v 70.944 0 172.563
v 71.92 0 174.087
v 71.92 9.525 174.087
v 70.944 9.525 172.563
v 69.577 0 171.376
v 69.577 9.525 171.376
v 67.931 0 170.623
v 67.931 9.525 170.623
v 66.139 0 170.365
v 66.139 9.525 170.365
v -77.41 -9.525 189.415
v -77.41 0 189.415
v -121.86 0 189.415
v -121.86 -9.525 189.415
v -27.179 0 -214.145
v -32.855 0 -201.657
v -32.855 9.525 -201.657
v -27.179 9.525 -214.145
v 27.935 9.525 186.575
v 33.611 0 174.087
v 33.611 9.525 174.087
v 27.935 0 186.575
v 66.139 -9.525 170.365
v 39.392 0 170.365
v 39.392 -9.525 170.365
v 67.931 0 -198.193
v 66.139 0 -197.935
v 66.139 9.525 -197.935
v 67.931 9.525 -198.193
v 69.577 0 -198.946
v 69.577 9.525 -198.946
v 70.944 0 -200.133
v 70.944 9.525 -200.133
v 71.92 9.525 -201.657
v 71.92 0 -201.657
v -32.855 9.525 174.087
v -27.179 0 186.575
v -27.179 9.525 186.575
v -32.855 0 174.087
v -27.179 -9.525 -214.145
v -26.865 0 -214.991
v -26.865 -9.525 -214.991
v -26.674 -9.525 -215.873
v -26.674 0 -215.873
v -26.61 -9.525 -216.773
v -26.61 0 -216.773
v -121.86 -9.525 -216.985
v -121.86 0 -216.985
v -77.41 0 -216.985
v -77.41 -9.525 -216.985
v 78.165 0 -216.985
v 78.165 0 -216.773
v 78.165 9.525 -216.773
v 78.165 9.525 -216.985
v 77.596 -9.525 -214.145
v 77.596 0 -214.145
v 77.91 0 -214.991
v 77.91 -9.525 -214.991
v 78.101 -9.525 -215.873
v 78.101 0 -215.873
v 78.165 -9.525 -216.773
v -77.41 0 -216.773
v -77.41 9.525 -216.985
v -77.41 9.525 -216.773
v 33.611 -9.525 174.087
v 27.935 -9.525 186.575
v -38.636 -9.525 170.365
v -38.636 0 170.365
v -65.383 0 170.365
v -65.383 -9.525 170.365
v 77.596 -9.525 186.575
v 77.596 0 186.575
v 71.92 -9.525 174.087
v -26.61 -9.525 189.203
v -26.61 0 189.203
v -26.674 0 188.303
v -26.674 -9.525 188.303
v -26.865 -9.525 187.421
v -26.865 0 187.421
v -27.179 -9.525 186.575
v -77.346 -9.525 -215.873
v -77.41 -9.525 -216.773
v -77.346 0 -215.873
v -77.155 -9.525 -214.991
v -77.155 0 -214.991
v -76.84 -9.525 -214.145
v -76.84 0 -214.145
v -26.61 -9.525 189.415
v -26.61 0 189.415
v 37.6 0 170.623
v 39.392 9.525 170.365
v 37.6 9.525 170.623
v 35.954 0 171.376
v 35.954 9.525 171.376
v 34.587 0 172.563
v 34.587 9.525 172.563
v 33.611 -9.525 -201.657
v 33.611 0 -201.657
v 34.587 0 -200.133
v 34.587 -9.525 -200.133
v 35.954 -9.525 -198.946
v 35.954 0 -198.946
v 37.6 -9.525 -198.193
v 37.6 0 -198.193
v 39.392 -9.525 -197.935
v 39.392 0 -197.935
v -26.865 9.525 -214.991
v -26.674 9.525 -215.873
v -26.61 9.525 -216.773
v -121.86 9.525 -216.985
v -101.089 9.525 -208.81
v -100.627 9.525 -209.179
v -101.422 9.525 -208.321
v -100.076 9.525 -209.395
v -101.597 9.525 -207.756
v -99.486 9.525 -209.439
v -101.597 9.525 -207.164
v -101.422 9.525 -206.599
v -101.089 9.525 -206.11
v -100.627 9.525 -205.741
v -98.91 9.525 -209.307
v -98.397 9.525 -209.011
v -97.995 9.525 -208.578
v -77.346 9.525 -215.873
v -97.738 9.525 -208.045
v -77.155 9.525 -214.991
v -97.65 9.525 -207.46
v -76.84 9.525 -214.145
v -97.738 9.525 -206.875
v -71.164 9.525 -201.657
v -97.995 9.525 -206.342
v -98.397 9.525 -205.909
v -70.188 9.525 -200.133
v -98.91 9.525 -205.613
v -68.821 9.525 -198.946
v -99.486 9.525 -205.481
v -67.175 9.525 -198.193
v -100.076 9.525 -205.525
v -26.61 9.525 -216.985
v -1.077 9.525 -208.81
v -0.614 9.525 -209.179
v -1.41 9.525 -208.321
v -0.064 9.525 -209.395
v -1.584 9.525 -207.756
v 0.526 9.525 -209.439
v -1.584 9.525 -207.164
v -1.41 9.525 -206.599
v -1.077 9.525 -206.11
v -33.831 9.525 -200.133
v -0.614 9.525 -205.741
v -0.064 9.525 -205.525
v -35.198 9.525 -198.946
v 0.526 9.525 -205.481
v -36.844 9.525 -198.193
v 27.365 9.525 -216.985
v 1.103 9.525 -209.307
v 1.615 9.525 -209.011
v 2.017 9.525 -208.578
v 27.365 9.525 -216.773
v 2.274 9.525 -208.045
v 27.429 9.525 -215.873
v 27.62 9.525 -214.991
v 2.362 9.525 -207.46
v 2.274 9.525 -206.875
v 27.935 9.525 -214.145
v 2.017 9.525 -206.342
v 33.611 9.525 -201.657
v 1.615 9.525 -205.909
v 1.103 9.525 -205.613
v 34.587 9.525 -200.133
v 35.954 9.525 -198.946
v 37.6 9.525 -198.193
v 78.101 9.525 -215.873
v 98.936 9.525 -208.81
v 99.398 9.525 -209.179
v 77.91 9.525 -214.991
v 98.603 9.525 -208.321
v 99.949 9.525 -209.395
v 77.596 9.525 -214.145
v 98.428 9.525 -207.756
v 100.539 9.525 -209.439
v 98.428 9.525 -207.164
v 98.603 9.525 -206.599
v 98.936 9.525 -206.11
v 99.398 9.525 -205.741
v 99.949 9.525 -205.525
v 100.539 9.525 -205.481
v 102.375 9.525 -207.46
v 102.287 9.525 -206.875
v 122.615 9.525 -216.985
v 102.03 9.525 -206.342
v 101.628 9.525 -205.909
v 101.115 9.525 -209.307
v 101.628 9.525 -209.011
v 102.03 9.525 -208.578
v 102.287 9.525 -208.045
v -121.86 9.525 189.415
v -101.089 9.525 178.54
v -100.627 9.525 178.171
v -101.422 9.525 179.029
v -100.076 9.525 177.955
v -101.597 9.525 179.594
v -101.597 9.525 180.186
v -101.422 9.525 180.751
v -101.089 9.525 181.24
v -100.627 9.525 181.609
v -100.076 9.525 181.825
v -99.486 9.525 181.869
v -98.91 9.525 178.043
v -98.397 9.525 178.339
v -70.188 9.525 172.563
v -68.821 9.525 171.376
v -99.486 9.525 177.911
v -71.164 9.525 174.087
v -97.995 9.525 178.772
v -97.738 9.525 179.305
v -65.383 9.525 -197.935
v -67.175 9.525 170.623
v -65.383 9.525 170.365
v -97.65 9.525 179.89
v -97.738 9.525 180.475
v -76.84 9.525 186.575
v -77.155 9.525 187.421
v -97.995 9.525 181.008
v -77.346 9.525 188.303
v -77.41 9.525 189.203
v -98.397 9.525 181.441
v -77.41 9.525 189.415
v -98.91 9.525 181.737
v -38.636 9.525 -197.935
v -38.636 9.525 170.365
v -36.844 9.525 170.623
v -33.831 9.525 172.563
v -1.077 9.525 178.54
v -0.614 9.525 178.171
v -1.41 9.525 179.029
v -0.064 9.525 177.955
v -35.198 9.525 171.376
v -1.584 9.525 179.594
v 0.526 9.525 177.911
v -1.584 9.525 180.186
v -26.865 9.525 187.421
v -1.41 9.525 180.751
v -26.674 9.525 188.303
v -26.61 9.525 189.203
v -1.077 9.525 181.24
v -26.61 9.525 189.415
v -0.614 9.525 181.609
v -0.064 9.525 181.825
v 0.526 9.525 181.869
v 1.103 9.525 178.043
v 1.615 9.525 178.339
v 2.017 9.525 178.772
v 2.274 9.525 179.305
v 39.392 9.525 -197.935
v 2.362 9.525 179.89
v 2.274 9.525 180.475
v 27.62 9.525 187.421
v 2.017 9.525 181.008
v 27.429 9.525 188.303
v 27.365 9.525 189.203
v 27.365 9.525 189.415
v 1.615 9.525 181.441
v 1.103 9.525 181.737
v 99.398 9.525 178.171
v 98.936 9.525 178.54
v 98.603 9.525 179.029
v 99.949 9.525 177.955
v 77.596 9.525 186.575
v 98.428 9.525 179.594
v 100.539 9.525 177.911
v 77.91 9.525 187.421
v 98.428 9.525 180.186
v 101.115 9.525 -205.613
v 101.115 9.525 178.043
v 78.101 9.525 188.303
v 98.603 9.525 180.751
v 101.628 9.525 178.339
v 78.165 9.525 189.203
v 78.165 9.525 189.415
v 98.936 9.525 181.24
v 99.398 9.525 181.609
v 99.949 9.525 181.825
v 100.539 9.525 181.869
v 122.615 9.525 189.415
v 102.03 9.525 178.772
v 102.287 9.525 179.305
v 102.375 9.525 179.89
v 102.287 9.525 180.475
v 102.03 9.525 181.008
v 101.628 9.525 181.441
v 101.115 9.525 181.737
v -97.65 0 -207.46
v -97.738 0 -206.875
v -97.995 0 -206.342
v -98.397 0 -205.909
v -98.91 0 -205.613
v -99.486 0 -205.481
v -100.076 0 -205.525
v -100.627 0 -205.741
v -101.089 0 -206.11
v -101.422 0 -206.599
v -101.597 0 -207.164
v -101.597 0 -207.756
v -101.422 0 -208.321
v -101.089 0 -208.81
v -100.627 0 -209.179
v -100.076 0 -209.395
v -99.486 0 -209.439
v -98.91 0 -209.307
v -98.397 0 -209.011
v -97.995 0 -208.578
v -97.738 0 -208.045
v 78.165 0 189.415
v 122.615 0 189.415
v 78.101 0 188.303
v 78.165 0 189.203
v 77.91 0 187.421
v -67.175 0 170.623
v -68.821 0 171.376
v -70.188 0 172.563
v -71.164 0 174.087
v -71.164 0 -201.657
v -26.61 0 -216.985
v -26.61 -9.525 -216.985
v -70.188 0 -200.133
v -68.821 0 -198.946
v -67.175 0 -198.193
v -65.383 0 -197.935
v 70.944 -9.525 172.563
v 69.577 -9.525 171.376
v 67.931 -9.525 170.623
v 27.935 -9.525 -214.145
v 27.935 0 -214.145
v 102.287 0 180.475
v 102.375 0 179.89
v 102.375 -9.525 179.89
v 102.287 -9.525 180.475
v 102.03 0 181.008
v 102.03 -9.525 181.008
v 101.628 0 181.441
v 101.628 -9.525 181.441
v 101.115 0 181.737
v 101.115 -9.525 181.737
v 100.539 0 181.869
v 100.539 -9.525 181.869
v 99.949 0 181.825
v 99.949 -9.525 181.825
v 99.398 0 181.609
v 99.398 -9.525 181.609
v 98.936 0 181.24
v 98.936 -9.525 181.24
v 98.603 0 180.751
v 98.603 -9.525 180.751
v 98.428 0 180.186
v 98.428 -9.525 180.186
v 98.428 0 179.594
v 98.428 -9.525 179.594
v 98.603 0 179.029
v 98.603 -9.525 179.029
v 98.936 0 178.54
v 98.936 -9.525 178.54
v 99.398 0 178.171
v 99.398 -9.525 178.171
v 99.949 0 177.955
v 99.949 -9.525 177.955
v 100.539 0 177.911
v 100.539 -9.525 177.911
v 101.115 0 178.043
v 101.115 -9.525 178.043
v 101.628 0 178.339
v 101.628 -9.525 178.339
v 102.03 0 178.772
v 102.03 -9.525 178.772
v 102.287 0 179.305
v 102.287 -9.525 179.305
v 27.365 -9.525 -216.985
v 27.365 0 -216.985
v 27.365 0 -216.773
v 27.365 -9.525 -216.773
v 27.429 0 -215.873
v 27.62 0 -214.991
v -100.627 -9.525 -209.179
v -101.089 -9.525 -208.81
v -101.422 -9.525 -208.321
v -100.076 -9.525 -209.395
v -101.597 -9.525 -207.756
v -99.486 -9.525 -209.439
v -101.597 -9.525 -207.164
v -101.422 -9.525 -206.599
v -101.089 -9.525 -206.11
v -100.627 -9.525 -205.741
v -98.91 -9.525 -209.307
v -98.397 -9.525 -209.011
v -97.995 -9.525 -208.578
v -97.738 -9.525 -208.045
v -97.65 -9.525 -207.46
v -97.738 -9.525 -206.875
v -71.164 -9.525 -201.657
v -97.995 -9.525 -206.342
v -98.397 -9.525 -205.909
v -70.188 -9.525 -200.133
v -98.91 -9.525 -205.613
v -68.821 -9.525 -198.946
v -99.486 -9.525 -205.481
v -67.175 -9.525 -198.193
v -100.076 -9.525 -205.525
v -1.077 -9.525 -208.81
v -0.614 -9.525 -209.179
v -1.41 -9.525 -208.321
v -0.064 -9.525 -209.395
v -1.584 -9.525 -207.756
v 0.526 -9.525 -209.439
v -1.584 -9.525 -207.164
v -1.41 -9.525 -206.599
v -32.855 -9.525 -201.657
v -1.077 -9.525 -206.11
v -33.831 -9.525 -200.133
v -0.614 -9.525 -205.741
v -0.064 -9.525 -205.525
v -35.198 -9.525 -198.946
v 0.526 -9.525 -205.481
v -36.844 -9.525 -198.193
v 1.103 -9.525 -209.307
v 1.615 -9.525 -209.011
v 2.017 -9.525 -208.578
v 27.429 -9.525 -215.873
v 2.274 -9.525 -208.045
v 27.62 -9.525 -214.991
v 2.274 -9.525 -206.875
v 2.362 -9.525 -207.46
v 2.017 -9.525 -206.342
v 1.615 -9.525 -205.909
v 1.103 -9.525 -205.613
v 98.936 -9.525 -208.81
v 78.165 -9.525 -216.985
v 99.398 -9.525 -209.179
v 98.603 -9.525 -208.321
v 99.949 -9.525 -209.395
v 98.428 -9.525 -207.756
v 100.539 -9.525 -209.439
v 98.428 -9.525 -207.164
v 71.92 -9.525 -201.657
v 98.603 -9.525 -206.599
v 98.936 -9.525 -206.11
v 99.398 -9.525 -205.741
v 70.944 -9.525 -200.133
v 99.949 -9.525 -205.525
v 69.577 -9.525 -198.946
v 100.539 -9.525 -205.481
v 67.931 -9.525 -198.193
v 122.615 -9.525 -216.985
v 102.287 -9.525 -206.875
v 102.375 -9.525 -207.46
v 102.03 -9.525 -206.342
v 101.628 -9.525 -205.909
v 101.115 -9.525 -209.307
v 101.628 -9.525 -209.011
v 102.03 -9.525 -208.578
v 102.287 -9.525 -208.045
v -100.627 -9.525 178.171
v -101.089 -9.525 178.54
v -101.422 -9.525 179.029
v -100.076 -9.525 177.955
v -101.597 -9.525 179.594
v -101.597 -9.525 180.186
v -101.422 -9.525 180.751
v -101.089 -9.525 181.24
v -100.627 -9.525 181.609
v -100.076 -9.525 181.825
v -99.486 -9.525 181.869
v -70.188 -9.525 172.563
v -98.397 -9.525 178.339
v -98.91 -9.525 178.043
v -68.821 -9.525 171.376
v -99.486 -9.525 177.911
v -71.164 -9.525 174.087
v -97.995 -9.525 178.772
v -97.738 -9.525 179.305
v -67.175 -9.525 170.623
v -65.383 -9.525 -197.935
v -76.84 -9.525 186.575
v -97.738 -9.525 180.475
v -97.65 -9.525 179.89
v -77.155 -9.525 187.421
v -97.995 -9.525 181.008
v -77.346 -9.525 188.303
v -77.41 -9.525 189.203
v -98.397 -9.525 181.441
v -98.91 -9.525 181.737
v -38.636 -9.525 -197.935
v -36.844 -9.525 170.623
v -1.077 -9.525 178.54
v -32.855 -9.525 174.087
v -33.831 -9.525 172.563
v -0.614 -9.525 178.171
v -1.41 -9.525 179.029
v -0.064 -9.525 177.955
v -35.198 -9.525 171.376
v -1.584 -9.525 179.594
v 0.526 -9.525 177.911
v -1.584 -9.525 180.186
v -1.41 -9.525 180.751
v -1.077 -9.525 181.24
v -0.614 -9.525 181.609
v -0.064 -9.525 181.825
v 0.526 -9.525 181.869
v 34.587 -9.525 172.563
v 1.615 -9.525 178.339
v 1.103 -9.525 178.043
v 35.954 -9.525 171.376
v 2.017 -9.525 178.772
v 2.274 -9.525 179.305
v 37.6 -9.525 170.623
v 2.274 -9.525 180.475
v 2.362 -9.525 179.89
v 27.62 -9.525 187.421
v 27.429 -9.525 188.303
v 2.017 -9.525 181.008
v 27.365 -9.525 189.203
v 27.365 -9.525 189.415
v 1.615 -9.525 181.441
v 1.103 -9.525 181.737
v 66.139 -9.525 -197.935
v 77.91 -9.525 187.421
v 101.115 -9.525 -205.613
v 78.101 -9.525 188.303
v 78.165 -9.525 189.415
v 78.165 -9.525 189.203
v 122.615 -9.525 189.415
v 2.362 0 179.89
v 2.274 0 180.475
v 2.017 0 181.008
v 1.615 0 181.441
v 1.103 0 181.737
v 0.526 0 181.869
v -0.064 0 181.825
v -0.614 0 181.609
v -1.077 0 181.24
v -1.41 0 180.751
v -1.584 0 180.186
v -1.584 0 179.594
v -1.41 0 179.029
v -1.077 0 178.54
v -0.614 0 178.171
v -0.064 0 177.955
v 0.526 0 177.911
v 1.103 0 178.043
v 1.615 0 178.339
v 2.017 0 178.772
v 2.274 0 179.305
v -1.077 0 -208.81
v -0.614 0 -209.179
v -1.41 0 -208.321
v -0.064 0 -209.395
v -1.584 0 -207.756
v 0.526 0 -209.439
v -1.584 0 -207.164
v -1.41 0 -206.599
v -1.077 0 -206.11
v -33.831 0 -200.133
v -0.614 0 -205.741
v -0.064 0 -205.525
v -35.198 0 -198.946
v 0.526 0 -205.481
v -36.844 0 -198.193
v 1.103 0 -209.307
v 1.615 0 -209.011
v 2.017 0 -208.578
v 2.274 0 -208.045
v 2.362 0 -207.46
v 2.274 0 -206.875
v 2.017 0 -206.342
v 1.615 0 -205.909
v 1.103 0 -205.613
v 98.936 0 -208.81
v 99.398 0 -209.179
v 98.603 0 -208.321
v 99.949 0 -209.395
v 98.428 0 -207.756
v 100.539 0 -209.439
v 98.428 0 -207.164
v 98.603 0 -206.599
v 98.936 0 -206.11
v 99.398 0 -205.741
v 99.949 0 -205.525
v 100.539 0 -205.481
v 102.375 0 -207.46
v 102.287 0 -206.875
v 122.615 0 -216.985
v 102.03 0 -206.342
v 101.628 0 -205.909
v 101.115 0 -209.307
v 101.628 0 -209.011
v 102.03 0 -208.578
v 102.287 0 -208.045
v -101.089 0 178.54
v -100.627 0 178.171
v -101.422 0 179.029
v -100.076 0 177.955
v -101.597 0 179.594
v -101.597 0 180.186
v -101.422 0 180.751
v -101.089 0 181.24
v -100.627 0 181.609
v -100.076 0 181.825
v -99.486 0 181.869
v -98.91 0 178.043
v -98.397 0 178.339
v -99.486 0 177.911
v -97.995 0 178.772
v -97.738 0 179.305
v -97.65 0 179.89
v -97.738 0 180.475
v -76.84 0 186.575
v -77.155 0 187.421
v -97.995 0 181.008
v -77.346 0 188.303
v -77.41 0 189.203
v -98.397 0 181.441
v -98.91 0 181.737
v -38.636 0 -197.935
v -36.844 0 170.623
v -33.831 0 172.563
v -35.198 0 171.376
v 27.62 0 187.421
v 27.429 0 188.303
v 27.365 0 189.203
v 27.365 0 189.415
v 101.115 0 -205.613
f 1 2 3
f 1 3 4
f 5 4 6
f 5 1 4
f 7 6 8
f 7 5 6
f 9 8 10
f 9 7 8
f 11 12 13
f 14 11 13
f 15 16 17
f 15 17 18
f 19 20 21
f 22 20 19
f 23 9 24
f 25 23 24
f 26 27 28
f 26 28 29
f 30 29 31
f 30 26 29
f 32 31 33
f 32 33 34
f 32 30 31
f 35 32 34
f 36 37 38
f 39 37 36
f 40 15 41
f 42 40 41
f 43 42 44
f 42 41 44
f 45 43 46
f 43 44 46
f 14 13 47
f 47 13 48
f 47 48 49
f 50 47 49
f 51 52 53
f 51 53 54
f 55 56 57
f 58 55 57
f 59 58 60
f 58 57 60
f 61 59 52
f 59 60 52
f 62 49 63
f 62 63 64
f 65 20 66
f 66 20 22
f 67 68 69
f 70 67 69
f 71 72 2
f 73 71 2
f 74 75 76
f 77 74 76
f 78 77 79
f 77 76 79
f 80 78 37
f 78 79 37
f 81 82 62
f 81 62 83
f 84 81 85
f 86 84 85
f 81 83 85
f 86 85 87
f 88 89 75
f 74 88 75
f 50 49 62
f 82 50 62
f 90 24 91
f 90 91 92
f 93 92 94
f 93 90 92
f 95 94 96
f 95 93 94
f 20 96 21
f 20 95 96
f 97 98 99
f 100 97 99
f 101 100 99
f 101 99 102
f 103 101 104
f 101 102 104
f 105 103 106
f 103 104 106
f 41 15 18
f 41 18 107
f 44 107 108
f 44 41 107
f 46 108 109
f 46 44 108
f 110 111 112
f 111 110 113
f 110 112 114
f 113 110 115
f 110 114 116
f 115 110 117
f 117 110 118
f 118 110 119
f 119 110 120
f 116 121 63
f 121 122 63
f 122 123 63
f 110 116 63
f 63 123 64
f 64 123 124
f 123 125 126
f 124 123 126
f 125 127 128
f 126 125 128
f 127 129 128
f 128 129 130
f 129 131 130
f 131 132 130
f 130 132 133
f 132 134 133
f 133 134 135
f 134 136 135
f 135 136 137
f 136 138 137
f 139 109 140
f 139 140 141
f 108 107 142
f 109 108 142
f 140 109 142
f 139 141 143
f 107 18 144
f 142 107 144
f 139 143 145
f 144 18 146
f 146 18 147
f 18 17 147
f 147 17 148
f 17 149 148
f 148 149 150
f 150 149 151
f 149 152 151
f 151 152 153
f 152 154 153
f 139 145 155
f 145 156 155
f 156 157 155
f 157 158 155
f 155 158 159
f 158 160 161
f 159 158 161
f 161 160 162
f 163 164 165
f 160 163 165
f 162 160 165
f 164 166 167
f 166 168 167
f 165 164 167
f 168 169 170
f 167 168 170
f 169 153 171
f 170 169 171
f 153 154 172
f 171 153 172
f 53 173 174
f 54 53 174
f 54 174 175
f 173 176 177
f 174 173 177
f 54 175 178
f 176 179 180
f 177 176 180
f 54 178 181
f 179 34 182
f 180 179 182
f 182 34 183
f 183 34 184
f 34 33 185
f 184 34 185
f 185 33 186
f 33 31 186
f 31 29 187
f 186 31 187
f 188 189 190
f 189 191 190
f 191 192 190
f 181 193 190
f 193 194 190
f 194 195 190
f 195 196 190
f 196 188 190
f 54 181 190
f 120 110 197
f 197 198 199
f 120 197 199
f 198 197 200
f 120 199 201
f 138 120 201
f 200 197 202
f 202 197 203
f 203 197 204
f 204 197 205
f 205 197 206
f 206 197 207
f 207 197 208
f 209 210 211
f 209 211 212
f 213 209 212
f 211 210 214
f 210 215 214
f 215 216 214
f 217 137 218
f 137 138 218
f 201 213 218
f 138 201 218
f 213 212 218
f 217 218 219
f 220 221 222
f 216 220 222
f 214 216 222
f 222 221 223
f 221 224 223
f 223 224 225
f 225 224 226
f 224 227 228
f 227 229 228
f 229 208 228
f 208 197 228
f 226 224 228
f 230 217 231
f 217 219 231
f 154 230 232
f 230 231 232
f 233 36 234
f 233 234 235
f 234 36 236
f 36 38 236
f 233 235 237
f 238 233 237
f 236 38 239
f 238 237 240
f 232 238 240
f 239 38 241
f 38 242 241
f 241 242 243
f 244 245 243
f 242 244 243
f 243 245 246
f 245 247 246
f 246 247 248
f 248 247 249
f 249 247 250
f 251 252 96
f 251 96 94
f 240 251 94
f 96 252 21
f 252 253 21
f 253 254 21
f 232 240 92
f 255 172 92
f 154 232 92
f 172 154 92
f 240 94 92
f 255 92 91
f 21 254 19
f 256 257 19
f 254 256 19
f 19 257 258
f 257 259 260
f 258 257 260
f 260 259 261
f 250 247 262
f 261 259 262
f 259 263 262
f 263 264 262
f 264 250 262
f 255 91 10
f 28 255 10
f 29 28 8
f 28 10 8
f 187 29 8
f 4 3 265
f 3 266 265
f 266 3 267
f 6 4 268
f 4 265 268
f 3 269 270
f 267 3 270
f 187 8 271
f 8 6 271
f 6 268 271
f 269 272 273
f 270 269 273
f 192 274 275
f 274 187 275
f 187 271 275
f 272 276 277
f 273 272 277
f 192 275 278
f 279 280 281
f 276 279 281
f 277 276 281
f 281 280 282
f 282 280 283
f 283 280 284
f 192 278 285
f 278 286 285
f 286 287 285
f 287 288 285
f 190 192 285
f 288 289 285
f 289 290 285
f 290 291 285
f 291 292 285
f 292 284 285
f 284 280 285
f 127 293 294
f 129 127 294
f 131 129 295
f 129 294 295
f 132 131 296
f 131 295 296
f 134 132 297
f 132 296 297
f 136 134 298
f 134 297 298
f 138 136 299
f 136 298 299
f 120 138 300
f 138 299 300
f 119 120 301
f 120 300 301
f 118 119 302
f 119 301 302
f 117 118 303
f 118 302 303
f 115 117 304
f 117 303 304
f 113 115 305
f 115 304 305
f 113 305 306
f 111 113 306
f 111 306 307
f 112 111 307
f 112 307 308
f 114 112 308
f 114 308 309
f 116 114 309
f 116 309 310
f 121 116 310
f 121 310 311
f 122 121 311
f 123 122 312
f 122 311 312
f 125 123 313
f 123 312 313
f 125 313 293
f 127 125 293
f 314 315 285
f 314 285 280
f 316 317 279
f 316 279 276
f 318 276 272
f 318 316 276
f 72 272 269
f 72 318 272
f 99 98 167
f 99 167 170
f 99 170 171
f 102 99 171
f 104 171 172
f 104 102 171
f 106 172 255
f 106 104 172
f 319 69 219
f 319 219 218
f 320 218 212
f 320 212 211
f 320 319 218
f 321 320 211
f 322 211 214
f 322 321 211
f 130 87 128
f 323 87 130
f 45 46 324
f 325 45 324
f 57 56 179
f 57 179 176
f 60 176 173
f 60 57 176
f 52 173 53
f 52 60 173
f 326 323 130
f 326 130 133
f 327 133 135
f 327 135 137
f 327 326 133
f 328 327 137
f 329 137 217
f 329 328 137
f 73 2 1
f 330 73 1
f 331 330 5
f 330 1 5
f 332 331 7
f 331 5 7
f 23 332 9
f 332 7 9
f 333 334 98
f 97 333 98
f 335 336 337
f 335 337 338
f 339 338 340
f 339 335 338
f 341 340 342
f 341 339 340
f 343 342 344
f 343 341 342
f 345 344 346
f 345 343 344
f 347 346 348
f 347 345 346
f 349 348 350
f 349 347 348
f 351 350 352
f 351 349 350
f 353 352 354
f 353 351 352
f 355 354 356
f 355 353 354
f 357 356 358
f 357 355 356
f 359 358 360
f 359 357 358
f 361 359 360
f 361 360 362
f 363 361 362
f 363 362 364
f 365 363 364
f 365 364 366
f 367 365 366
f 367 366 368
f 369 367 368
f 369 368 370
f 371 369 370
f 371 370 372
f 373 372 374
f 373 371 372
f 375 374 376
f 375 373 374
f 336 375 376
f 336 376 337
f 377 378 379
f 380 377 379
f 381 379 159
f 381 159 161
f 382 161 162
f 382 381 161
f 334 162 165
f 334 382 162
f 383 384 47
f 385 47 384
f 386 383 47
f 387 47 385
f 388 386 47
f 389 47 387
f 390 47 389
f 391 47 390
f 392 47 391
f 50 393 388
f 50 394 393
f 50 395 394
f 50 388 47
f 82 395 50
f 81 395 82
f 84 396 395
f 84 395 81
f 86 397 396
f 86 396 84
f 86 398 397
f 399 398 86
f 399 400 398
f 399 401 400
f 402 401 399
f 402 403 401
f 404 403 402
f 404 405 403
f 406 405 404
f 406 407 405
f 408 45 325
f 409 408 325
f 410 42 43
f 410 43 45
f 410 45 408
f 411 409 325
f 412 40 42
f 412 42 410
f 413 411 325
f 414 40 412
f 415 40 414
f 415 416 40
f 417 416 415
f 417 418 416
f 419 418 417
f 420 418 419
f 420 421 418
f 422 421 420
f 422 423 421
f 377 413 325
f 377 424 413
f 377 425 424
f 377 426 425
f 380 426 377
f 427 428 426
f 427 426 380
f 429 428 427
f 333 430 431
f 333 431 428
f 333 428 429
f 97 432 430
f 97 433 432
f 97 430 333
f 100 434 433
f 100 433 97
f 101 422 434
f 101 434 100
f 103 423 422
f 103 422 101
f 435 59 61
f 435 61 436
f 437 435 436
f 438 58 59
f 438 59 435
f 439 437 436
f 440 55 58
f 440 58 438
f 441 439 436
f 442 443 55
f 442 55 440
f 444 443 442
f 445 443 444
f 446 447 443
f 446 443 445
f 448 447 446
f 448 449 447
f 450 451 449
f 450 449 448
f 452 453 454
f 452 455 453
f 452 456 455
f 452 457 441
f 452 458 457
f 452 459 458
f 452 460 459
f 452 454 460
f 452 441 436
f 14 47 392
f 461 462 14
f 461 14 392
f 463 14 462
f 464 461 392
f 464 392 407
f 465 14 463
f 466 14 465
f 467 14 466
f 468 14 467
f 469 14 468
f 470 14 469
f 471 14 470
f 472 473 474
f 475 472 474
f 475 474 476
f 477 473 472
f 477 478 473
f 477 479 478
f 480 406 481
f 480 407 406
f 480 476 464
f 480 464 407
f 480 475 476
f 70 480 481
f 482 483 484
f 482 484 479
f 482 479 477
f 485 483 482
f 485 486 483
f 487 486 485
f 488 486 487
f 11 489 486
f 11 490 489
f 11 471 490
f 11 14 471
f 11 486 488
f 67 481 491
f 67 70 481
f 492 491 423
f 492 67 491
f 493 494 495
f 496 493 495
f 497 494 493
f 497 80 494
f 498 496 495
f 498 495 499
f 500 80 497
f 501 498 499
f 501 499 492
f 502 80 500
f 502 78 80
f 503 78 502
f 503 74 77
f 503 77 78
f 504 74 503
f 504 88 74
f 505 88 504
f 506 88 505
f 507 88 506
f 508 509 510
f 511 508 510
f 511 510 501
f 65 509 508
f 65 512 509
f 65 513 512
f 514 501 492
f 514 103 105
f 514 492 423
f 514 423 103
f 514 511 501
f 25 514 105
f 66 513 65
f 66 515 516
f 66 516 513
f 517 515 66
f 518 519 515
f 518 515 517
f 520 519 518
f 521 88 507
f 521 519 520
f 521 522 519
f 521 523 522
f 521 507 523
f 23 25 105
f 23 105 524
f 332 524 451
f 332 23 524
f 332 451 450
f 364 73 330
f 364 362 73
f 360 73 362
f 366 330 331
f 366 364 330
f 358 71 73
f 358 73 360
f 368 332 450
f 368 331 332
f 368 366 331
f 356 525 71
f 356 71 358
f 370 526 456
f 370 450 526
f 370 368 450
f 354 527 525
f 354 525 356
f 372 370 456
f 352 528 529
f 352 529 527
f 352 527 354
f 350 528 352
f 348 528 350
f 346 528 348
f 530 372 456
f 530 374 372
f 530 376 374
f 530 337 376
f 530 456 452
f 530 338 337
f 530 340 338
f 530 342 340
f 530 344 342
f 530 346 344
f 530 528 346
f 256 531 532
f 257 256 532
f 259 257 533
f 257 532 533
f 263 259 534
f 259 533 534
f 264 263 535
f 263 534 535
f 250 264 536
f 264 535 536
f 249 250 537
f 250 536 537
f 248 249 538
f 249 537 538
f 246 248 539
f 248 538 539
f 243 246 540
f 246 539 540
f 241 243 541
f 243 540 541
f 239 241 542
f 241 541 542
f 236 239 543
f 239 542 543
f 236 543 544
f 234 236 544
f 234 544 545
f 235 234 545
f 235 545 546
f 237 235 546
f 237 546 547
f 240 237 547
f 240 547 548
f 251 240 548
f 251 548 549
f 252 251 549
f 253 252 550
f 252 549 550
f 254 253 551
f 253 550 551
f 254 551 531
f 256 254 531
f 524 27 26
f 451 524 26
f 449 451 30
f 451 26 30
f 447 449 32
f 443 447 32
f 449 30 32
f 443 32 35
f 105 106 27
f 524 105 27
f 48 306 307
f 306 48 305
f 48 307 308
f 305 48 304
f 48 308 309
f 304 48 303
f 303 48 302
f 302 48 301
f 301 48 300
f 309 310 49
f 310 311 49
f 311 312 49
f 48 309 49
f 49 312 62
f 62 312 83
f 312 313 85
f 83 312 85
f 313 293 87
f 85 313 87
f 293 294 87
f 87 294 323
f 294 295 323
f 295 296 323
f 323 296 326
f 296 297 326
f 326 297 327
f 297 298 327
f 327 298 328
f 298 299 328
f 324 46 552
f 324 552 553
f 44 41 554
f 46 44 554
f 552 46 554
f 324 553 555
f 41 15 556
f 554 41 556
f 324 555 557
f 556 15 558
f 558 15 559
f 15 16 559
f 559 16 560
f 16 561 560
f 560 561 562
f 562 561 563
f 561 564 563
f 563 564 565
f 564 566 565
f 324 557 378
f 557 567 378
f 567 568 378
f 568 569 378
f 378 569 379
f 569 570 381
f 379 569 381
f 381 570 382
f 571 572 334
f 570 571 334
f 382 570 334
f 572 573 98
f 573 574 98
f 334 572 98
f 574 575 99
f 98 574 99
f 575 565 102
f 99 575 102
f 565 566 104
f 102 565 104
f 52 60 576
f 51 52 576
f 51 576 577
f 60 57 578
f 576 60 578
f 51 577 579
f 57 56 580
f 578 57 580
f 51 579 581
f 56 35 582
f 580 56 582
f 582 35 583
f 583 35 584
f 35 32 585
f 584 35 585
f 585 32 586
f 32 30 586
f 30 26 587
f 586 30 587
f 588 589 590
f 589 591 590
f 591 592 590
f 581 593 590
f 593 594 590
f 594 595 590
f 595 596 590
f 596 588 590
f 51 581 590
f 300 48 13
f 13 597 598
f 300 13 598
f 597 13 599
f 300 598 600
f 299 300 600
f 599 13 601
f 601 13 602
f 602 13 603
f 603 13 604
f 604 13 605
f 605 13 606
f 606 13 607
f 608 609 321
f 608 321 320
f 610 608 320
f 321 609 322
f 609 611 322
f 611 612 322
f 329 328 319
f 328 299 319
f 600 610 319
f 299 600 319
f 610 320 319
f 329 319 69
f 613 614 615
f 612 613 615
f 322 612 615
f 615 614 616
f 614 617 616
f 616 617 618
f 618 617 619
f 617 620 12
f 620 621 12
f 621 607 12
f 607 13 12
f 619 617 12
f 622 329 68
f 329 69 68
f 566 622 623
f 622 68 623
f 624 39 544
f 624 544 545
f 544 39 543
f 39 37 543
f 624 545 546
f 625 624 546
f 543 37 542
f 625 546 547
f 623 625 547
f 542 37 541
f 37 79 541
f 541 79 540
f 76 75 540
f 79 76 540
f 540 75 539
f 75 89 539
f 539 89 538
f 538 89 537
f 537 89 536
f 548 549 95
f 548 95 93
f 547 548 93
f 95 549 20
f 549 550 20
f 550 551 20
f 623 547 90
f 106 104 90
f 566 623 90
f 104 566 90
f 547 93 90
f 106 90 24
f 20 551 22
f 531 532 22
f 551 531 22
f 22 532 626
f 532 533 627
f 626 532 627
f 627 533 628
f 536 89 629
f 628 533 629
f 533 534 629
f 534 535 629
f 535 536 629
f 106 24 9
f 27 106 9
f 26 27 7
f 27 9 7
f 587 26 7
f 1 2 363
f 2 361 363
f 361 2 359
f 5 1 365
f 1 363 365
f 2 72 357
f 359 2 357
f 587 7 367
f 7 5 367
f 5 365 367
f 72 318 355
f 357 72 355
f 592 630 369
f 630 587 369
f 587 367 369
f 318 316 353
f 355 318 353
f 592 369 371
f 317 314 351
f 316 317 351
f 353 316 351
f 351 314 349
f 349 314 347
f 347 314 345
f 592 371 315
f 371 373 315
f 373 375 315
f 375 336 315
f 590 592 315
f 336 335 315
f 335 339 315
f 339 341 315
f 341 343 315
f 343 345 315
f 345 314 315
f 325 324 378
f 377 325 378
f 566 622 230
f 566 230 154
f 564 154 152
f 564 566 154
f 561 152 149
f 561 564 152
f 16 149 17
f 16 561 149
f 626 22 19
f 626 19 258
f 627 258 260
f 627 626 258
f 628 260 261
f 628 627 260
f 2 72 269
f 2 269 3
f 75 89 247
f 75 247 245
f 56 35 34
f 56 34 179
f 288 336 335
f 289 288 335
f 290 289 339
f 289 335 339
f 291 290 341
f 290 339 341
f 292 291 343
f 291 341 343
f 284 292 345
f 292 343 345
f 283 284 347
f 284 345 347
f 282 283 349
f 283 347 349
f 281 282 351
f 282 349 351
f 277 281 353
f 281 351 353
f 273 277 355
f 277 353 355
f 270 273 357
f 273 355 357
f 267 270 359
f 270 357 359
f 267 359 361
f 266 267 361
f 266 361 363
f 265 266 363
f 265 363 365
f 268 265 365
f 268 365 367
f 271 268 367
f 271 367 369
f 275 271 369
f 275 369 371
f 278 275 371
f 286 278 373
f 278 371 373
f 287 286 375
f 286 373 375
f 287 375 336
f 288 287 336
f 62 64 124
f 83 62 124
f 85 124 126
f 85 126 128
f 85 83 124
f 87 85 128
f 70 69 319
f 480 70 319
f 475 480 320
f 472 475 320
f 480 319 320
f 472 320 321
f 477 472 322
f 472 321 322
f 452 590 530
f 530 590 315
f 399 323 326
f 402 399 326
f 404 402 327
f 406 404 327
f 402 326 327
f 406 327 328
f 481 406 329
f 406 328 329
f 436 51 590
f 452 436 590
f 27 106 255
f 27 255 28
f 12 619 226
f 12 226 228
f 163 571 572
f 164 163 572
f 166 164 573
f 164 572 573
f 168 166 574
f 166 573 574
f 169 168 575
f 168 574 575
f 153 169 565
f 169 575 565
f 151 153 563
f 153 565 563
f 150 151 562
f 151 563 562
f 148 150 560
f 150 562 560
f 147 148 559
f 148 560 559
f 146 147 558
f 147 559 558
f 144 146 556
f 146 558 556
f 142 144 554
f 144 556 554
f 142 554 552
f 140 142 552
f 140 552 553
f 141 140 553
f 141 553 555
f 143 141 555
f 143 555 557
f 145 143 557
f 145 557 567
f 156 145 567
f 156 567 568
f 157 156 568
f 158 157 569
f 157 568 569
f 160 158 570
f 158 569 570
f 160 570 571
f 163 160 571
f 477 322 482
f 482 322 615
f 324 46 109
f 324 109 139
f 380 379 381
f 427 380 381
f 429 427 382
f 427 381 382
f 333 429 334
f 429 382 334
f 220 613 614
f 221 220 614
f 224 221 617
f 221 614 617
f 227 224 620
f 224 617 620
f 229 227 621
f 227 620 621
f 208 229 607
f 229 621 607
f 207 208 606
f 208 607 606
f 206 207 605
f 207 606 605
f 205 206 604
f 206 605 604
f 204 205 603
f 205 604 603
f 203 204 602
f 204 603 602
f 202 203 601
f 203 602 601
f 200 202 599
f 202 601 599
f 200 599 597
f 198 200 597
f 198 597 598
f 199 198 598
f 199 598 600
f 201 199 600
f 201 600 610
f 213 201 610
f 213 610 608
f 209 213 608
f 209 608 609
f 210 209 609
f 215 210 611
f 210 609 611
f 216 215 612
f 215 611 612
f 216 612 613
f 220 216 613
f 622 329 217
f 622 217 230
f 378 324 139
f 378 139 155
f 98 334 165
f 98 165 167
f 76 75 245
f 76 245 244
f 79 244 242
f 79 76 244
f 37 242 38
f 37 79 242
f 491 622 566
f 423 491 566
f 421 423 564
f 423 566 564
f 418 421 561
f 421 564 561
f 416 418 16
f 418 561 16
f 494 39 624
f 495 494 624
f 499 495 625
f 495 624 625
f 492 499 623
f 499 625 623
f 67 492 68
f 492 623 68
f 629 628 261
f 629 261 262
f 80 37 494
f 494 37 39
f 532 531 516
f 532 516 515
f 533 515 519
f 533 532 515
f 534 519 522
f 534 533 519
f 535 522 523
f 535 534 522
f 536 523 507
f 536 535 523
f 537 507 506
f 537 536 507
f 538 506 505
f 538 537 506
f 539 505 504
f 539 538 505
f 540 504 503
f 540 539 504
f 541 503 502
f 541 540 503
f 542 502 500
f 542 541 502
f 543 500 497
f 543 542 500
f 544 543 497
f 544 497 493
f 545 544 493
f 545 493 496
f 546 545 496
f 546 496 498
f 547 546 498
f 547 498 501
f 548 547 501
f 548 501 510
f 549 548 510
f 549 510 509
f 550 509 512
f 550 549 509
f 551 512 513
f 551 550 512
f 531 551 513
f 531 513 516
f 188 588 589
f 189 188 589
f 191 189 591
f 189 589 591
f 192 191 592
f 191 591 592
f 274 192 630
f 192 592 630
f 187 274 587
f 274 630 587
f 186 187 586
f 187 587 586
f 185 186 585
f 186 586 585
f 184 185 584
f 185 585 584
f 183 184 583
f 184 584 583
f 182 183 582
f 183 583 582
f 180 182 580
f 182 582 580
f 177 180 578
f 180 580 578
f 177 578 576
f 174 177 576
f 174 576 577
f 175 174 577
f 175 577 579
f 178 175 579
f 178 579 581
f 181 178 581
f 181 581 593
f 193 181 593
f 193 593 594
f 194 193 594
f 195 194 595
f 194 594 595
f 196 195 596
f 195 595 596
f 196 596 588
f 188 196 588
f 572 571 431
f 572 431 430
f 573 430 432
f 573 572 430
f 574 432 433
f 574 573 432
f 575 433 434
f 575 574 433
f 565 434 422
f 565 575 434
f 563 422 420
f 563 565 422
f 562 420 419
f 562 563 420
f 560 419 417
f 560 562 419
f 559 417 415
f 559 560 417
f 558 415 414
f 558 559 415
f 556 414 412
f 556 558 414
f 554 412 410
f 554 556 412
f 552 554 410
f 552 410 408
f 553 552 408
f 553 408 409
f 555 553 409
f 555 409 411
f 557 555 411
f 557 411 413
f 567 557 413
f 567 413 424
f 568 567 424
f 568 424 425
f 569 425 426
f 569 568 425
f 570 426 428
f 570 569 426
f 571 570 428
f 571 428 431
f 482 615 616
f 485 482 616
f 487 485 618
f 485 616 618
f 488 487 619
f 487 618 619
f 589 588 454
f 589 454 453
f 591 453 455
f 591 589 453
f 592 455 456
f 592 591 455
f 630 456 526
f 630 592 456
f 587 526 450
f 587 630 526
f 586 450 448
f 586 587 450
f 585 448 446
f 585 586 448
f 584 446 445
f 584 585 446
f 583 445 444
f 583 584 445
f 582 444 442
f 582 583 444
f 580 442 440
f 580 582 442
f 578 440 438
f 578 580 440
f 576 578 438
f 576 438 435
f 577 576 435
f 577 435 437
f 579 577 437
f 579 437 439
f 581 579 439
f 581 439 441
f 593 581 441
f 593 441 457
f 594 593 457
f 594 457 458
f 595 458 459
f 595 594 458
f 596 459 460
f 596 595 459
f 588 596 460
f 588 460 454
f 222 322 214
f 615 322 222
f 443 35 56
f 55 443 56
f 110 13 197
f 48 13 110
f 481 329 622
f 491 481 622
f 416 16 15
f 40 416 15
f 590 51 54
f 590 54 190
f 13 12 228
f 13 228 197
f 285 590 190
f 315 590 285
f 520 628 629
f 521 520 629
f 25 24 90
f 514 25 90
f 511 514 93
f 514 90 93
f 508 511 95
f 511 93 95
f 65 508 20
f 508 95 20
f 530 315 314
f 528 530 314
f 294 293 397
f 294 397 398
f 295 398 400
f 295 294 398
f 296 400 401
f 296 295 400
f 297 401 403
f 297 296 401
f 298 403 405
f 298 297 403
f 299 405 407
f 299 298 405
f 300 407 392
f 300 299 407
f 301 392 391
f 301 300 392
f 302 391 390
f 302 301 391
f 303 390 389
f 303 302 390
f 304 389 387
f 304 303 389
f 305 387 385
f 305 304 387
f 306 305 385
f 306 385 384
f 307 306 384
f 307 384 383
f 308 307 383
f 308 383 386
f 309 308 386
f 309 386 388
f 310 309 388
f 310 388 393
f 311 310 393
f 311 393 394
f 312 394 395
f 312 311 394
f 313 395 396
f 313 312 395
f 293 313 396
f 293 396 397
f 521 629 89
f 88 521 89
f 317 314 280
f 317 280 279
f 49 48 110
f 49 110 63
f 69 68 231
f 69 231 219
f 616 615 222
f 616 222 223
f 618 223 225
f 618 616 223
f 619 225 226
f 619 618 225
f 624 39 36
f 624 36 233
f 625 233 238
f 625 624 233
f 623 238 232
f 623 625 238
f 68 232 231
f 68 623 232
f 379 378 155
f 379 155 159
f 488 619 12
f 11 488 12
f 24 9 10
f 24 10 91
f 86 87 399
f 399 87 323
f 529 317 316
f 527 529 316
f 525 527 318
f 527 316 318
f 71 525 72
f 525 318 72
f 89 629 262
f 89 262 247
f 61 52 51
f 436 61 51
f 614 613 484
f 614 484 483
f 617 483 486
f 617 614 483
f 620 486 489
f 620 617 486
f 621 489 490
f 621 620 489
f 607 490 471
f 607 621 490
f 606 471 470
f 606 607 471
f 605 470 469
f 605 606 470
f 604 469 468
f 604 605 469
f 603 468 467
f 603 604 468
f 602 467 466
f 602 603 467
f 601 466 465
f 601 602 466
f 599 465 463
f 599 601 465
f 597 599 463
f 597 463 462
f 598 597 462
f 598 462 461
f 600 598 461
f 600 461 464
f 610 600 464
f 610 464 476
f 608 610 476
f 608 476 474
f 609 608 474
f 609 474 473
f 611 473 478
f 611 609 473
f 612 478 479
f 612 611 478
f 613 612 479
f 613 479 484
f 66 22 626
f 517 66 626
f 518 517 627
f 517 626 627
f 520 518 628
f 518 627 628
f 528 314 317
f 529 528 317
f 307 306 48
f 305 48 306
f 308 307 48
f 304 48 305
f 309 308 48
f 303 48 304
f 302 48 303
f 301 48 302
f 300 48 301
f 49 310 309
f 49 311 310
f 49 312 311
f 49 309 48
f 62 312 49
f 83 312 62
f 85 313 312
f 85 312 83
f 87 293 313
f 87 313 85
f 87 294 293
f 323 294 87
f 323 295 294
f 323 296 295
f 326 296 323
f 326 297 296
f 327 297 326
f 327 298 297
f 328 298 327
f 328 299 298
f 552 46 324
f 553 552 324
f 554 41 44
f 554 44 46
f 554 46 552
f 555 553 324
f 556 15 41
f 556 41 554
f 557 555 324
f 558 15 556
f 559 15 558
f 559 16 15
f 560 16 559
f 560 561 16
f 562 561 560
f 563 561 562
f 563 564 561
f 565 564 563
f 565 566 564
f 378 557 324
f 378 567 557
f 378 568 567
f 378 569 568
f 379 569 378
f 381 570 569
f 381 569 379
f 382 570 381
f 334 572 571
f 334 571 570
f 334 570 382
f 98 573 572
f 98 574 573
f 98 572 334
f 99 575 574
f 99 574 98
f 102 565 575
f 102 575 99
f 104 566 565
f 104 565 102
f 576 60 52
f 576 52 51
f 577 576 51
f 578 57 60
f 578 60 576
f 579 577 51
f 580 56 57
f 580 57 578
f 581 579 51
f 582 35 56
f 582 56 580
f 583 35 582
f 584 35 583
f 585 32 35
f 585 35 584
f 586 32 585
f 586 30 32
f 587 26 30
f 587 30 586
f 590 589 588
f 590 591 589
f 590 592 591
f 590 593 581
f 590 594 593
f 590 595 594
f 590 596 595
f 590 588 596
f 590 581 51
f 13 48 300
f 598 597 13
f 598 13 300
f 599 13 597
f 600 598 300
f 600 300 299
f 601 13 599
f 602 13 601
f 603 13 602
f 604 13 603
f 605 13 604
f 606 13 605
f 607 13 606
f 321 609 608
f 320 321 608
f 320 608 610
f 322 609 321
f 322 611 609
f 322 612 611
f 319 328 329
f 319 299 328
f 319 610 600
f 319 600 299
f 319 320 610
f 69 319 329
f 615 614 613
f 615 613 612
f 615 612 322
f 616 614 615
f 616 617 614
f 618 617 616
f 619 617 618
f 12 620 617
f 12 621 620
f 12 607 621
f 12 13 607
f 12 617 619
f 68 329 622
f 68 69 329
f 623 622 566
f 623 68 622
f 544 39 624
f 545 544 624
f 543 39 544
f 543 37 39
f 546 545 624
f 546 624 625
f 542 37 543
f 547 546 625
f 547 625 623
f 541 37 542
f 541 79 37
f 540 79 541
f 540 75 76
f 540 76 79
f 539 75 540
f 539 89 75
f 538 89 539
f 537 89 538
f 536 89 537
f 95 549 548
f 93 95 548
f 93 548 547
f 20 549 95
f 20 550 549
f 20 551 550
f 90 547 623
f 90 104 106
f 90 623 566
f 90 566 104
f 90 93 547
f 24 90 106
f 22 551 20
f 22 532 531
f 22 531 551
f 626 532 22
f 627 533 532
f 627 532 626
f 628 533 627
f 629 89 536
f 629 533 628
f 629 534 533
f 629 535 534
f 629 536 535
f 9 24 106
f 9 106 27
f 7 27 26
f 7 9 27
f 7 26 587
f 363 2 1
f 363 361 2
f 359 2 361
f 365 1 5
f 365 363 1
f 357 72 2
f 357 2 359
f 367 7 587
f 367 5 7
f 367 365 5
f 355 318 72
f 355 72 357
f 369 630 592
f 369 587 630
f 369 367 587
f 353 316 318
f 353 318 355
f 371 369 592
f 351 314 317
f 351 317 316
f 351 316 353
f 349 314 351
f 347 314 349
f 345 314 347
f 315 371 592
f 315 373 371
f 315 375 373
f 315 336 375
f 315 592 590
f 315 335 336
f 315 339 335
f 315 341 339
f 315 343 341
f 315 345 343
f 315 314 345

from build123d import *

# Parameters (mm, degrees)
F0_R     = 1.984375
F1_DEPTH = 9.525
F2_DEPTH = 9.525


with BuildPart() as f1:
    # F0 (on Front) → F1 (new body)
    with BuildSketch(Plane.XZ):
        with BuildLine():
            Line((-77.409625, 189.415018), (-121.859625, 189.415018))
            Line((-121.859625, 189.415018), (-121.859625, -216.984982))
            Line((-121.859625, -216.984982), (-77.409625, -216.984982))
            Line((-77.409625, -216.984982), (-77.409625, -216.772931))
            ThreePointArc((-77.409625, -216.772931), (-77.265701, -215.428637), (-76.840451, -214.14528))
            Line((-76.840451, -214.14528), (-71.164103, -201.65733))
            ThreePointArc((-71.164103, -201.65733), (-68.821075, -198.946064), (-65.383277, -197.934982))
            Line((-65.383277, -197.934982), (-38.635973, -197.934982))
            ThreePointArc((-38.635973, -197.934982), (-35.198175, -198.946064), (-32.855147, -201.65733))
            Line((-32.855147, -201.65733), (-27.178799, -214.14528))
            ThreePointArc((-27.178799, -214.14528), (-26.75355, -215.428637), (-26.609625, -216.772931))
            Line((-26.609625, -216.772931), (-26.609625, -216.984982))
            Line((-26.609625, -216.984982), (27.365375, -216.984982))
            Line((27.365375, -216.984982), (27.365375, -216.772931))
            ThreePointArc((27.365375, -216.772931), (27.509299, -215.428637), (27.934549, -214.14528))
            Line((27.934549, -214.14528), (33.610897, -201.65733))
            ThreePointArc((33.610897, -201.65733), (35.953925, -198.946064), (39.391723, -197.934982))
            Line((39.391723, -197.934982), (66.139027, -197.934982))
            ThreePointArc((66.139027, -197.934982), (69.576825, -198.946064), (71.919853, -201.65733))
            Line((71.919853, -201.65733), (77.596201, -214.14528))
            ThreePointArc((77.596201, -214.14528), (78.02145, -215.428637), (78.165375, -216.772931))
            Line((78.165375, -216.772931), (78.165375, -216.984982))
            Line((78.165375, -216.984982), (122.615375, -216.984982))
            Line((122.615375, -216.984982), (122.615375, 189.415018))
            Line((122.615375, 189.415018), (78.165375, 189.415018))
            Line((78.165375, 189.415018), (78.165375, 189.202968))
            ThreePointArc((78.165375, 189.202968), (78.02145, 187.858673), (77.596201, 186.575316))
            Line((77.596201, 186.575316), (71.919853, 174.087367))
            ThreePointArc((71.919853, 174.087367), (69.576825, 171.3761), (66.139027, 170.365018))
            Line((66.139027, 170.365018), (39.391723, 170.365018))
            ThreePointArc((39.391723, 170.365018), (35.953925, 171.3761), (33.610897, 174.087367))
            Line((33.610897, 174.087367), (27.934549, 186.575316))
            ThreePointArc((27.934549, 186.575316), (27.509299, 187.858673), (27.365375, 189.202968))
            Line((27.365375, 189.202968), (27.365375, 189.415018))
            Line((27.365375, 189.415018), (-26.609625, 189.415018))
            Line((-26.609625, 189.415018), (-26.609625, 189.202968))
            ThreePointArc((-26.609625, 189.202968), (-26.75355, 187.858673), (-27.178799, 186.575316))
            Line((-27.178799, 186.575316), (-32.855147, 174.087367))
            ThreePointArc((-32.855147, 174.087367), (-35.198175, 171.3761), (-38.635973, 170.365018))
            Line((-38.635973, 170.365018), (-65.383277, 170.365018))
            ThreePointArc((-65.383277, 170.365018), (-68.821075, 171.3761), (-71.164103, 174.087367))
            Line((-71.164103, 174.087367), (-76.840451, 186.575316))
            ThreePointArc((-76.840451, 186.575316), (-77.265701, 187.858673), (-77.409625, 189.202968))
            Line((-77.409625, 189.202968), (-77.409625, 189.415018))
        make_face()
        with Locations((-99.634625, -207.459982)):
            Circle(F0_R, mode=Mode.SUBTRACT)
        with Locations((0.377875, -207.459982)):
            Circle(F0_R, mode=Mode.SUBTRACT)
        with Locations((100.390375, -207.459982)):
            Circle(F0_R, mode=Mode.SUBTRACT)
        with Locations((-99.634625, 179.890018)):
            Circle(F0_R, mode=Mode.SUBTRACT)
        with Locations((0.377875, 179.890018)):
            Circle(F0_R, mode=Mode.SUBTRACT)
        with Locations((100.390375, 179.890018)):
            Circle(F0_R, mode=Mode.SUBTRACT)
    extrude(amount=F1_DEPTH)


with BuildPart() as f2:
    # F0 (on Front) → F2 (new body)
    with BuildSketch(Plane.XZ):
        with BuildLine():
            Line((-77.409625, 189.415018), (-121.859625, 189.415018))
            Line((-121.859625, 189.415018), (-121.859625, -216.984982))
            Line((-121.859625, -216.984982), (-77.409625, -216.984982))
            Line((-77.409625, -216.984982), (-77.409625, -216.772931))
            ThreePointArc((-77.409625, -216.772931), (-77.265701, -215.428637), (-76.840451, -214.14528))
            Line((-76.840451, -214.14528), (-71.164103, -201.65733))
            ThreePointArc((-71.164103, -201.65733), (-68.821075, -198.946064), (-65.383277, -197.934982))
            Line((-65.383277, -197.934982), (-38.635973, -197.934982))
            ThreePointArc((-38.635973, -197.934982), (-35.198175, -198.946064), (-32.855147, -201.65733))
            Line((-32.855147, -201.65733), (-27.178799, -214.14528))
            ThreePointArc((-27.178799, -214.14528), (-26.75355, -215.428637), (-26.609625, -216.772931))
            Line((-26.609625, -216.772931), (-26.609625, -216.984982))
            Line((-26.609625, -216.984982), (27.365375, -216.984982))
            Line((27.365375, -216.984982), (27.365375, -216.772931))
            ThreePointArc((27.365375, -216.772931), (27.509299, -215.428637), (27.934549, -214.14528))
            Line((27.934549, -214.14528), (33.610897, -201.65733))
            ThreePointArc((33.610897, -201.65733), (35.953925, -198.946064), (39.391723, -197.934982))
            Line((39.391723, -197.934982), (66.139027, -197.934982))
            ThreePointArc((66.139027, -197.934982), (69.576825, -198.946064), (71.919853, -201.65733))
            Line((71.919853, -201.65733), (77.596201, -214.14528))
            ThreePointArc((77.596201, -214.14528), (78.02145, -215.428637), (78.165375, -216.772931))
            Line((78.165375, -216.772931), (78.165375, -216.984982))
            Line((78.165375, -216.984982), (122.615375, -216.984982))
            Line((122.615375, -216.984982), (122.615375, 189.415018))
            Line((122.615375, 189.415018), (78.165375, 189.415018))
            Line((78.165375, 189.415018), (78.165375, 189.202968))
            ThreePointArc((78.165375, 189.202968), (78.02145, 187.858673), (77.596201, 186.575316))
            Line((77.596201, 186.575316), (71.919853, 174.087367))
            ThreePointArc((71.919853, 174.087367), (69.576825, 171.3761), (66.139027, 170.365018))
            Line((66.139027, 170.365018), (39.391723, 170.365018))
            ThreePointArc((39.391723, 170.365018), (35.953925, 171.3761), (33.610897, 174.087367))
            Line((33.610897, 174.087367), (27.934549, 186.575316))
            ThreePointArc((27.934549, 186.575316), (27.509299, 187.858673), (27.365375, 189.202968))
            Line((27.365375, 189.202968), (27.365375, 189.415018))
            Line((27.365375, 189.415018), (-26.609625, 189.415018))
            Line((-26.609625, 189.415018), (-26.609625, 189.202968))
            ThreePointArc((-26.609625, 189.202968), (-26.75355, 187.858673), (-27.178799, 186.575316))
            Line((-27.178799, 186.575316), (-32.855147, 174.087367))
            ThreePointArc((-32.855147, 174.087367), (-35.198175, 171.3761), (-38.635973, 170.365018))
            Line((-38.635973, 170.365018), (-65.383277, 170.365018))
            ThreePointArc((-65.383277, 170.365018), (-68.821075, 171.3761), (-71.164103, 174.087367))
            Line((-71.164103, 174.087367), (-76.840451, 186.575316))
            ThreePointArc((-76.840451, 186.575316), (-77.265701, 187.858673), (-77.409625, 189.202968))
            Line((-77.409625, 189.202968), (-77.409625, 189.415018))
        make_face()
        with Locations((-99.634625, -207.459982)):
            Circle(F0_R, mode=Mode.SUBTRACT)
        with Locations((0.377875, -207.459982)):
            Circle(F0_R, mode=Mode.SUBTRACT)
        with Locations((100.390375, -207.459982)):
            Circle(F0_R, mode=Mode.SUBTRACT)
        with Locations((-99.634625, 179.890018)):
            Circle(F0_R, mode=Mode.SUBTRACT)
        with Locations((0.377875, 179.890018)):
            Circle(F0_R, mode=Mode.SUBTRACT)
        with Locations((100.390375, 179.890018)):
            Circle(F0_R, mode=Mode.SUBTRACT)
    extrude(amount=-F2_DEPTH)


solid = Compound([f1.part, f2.part])
